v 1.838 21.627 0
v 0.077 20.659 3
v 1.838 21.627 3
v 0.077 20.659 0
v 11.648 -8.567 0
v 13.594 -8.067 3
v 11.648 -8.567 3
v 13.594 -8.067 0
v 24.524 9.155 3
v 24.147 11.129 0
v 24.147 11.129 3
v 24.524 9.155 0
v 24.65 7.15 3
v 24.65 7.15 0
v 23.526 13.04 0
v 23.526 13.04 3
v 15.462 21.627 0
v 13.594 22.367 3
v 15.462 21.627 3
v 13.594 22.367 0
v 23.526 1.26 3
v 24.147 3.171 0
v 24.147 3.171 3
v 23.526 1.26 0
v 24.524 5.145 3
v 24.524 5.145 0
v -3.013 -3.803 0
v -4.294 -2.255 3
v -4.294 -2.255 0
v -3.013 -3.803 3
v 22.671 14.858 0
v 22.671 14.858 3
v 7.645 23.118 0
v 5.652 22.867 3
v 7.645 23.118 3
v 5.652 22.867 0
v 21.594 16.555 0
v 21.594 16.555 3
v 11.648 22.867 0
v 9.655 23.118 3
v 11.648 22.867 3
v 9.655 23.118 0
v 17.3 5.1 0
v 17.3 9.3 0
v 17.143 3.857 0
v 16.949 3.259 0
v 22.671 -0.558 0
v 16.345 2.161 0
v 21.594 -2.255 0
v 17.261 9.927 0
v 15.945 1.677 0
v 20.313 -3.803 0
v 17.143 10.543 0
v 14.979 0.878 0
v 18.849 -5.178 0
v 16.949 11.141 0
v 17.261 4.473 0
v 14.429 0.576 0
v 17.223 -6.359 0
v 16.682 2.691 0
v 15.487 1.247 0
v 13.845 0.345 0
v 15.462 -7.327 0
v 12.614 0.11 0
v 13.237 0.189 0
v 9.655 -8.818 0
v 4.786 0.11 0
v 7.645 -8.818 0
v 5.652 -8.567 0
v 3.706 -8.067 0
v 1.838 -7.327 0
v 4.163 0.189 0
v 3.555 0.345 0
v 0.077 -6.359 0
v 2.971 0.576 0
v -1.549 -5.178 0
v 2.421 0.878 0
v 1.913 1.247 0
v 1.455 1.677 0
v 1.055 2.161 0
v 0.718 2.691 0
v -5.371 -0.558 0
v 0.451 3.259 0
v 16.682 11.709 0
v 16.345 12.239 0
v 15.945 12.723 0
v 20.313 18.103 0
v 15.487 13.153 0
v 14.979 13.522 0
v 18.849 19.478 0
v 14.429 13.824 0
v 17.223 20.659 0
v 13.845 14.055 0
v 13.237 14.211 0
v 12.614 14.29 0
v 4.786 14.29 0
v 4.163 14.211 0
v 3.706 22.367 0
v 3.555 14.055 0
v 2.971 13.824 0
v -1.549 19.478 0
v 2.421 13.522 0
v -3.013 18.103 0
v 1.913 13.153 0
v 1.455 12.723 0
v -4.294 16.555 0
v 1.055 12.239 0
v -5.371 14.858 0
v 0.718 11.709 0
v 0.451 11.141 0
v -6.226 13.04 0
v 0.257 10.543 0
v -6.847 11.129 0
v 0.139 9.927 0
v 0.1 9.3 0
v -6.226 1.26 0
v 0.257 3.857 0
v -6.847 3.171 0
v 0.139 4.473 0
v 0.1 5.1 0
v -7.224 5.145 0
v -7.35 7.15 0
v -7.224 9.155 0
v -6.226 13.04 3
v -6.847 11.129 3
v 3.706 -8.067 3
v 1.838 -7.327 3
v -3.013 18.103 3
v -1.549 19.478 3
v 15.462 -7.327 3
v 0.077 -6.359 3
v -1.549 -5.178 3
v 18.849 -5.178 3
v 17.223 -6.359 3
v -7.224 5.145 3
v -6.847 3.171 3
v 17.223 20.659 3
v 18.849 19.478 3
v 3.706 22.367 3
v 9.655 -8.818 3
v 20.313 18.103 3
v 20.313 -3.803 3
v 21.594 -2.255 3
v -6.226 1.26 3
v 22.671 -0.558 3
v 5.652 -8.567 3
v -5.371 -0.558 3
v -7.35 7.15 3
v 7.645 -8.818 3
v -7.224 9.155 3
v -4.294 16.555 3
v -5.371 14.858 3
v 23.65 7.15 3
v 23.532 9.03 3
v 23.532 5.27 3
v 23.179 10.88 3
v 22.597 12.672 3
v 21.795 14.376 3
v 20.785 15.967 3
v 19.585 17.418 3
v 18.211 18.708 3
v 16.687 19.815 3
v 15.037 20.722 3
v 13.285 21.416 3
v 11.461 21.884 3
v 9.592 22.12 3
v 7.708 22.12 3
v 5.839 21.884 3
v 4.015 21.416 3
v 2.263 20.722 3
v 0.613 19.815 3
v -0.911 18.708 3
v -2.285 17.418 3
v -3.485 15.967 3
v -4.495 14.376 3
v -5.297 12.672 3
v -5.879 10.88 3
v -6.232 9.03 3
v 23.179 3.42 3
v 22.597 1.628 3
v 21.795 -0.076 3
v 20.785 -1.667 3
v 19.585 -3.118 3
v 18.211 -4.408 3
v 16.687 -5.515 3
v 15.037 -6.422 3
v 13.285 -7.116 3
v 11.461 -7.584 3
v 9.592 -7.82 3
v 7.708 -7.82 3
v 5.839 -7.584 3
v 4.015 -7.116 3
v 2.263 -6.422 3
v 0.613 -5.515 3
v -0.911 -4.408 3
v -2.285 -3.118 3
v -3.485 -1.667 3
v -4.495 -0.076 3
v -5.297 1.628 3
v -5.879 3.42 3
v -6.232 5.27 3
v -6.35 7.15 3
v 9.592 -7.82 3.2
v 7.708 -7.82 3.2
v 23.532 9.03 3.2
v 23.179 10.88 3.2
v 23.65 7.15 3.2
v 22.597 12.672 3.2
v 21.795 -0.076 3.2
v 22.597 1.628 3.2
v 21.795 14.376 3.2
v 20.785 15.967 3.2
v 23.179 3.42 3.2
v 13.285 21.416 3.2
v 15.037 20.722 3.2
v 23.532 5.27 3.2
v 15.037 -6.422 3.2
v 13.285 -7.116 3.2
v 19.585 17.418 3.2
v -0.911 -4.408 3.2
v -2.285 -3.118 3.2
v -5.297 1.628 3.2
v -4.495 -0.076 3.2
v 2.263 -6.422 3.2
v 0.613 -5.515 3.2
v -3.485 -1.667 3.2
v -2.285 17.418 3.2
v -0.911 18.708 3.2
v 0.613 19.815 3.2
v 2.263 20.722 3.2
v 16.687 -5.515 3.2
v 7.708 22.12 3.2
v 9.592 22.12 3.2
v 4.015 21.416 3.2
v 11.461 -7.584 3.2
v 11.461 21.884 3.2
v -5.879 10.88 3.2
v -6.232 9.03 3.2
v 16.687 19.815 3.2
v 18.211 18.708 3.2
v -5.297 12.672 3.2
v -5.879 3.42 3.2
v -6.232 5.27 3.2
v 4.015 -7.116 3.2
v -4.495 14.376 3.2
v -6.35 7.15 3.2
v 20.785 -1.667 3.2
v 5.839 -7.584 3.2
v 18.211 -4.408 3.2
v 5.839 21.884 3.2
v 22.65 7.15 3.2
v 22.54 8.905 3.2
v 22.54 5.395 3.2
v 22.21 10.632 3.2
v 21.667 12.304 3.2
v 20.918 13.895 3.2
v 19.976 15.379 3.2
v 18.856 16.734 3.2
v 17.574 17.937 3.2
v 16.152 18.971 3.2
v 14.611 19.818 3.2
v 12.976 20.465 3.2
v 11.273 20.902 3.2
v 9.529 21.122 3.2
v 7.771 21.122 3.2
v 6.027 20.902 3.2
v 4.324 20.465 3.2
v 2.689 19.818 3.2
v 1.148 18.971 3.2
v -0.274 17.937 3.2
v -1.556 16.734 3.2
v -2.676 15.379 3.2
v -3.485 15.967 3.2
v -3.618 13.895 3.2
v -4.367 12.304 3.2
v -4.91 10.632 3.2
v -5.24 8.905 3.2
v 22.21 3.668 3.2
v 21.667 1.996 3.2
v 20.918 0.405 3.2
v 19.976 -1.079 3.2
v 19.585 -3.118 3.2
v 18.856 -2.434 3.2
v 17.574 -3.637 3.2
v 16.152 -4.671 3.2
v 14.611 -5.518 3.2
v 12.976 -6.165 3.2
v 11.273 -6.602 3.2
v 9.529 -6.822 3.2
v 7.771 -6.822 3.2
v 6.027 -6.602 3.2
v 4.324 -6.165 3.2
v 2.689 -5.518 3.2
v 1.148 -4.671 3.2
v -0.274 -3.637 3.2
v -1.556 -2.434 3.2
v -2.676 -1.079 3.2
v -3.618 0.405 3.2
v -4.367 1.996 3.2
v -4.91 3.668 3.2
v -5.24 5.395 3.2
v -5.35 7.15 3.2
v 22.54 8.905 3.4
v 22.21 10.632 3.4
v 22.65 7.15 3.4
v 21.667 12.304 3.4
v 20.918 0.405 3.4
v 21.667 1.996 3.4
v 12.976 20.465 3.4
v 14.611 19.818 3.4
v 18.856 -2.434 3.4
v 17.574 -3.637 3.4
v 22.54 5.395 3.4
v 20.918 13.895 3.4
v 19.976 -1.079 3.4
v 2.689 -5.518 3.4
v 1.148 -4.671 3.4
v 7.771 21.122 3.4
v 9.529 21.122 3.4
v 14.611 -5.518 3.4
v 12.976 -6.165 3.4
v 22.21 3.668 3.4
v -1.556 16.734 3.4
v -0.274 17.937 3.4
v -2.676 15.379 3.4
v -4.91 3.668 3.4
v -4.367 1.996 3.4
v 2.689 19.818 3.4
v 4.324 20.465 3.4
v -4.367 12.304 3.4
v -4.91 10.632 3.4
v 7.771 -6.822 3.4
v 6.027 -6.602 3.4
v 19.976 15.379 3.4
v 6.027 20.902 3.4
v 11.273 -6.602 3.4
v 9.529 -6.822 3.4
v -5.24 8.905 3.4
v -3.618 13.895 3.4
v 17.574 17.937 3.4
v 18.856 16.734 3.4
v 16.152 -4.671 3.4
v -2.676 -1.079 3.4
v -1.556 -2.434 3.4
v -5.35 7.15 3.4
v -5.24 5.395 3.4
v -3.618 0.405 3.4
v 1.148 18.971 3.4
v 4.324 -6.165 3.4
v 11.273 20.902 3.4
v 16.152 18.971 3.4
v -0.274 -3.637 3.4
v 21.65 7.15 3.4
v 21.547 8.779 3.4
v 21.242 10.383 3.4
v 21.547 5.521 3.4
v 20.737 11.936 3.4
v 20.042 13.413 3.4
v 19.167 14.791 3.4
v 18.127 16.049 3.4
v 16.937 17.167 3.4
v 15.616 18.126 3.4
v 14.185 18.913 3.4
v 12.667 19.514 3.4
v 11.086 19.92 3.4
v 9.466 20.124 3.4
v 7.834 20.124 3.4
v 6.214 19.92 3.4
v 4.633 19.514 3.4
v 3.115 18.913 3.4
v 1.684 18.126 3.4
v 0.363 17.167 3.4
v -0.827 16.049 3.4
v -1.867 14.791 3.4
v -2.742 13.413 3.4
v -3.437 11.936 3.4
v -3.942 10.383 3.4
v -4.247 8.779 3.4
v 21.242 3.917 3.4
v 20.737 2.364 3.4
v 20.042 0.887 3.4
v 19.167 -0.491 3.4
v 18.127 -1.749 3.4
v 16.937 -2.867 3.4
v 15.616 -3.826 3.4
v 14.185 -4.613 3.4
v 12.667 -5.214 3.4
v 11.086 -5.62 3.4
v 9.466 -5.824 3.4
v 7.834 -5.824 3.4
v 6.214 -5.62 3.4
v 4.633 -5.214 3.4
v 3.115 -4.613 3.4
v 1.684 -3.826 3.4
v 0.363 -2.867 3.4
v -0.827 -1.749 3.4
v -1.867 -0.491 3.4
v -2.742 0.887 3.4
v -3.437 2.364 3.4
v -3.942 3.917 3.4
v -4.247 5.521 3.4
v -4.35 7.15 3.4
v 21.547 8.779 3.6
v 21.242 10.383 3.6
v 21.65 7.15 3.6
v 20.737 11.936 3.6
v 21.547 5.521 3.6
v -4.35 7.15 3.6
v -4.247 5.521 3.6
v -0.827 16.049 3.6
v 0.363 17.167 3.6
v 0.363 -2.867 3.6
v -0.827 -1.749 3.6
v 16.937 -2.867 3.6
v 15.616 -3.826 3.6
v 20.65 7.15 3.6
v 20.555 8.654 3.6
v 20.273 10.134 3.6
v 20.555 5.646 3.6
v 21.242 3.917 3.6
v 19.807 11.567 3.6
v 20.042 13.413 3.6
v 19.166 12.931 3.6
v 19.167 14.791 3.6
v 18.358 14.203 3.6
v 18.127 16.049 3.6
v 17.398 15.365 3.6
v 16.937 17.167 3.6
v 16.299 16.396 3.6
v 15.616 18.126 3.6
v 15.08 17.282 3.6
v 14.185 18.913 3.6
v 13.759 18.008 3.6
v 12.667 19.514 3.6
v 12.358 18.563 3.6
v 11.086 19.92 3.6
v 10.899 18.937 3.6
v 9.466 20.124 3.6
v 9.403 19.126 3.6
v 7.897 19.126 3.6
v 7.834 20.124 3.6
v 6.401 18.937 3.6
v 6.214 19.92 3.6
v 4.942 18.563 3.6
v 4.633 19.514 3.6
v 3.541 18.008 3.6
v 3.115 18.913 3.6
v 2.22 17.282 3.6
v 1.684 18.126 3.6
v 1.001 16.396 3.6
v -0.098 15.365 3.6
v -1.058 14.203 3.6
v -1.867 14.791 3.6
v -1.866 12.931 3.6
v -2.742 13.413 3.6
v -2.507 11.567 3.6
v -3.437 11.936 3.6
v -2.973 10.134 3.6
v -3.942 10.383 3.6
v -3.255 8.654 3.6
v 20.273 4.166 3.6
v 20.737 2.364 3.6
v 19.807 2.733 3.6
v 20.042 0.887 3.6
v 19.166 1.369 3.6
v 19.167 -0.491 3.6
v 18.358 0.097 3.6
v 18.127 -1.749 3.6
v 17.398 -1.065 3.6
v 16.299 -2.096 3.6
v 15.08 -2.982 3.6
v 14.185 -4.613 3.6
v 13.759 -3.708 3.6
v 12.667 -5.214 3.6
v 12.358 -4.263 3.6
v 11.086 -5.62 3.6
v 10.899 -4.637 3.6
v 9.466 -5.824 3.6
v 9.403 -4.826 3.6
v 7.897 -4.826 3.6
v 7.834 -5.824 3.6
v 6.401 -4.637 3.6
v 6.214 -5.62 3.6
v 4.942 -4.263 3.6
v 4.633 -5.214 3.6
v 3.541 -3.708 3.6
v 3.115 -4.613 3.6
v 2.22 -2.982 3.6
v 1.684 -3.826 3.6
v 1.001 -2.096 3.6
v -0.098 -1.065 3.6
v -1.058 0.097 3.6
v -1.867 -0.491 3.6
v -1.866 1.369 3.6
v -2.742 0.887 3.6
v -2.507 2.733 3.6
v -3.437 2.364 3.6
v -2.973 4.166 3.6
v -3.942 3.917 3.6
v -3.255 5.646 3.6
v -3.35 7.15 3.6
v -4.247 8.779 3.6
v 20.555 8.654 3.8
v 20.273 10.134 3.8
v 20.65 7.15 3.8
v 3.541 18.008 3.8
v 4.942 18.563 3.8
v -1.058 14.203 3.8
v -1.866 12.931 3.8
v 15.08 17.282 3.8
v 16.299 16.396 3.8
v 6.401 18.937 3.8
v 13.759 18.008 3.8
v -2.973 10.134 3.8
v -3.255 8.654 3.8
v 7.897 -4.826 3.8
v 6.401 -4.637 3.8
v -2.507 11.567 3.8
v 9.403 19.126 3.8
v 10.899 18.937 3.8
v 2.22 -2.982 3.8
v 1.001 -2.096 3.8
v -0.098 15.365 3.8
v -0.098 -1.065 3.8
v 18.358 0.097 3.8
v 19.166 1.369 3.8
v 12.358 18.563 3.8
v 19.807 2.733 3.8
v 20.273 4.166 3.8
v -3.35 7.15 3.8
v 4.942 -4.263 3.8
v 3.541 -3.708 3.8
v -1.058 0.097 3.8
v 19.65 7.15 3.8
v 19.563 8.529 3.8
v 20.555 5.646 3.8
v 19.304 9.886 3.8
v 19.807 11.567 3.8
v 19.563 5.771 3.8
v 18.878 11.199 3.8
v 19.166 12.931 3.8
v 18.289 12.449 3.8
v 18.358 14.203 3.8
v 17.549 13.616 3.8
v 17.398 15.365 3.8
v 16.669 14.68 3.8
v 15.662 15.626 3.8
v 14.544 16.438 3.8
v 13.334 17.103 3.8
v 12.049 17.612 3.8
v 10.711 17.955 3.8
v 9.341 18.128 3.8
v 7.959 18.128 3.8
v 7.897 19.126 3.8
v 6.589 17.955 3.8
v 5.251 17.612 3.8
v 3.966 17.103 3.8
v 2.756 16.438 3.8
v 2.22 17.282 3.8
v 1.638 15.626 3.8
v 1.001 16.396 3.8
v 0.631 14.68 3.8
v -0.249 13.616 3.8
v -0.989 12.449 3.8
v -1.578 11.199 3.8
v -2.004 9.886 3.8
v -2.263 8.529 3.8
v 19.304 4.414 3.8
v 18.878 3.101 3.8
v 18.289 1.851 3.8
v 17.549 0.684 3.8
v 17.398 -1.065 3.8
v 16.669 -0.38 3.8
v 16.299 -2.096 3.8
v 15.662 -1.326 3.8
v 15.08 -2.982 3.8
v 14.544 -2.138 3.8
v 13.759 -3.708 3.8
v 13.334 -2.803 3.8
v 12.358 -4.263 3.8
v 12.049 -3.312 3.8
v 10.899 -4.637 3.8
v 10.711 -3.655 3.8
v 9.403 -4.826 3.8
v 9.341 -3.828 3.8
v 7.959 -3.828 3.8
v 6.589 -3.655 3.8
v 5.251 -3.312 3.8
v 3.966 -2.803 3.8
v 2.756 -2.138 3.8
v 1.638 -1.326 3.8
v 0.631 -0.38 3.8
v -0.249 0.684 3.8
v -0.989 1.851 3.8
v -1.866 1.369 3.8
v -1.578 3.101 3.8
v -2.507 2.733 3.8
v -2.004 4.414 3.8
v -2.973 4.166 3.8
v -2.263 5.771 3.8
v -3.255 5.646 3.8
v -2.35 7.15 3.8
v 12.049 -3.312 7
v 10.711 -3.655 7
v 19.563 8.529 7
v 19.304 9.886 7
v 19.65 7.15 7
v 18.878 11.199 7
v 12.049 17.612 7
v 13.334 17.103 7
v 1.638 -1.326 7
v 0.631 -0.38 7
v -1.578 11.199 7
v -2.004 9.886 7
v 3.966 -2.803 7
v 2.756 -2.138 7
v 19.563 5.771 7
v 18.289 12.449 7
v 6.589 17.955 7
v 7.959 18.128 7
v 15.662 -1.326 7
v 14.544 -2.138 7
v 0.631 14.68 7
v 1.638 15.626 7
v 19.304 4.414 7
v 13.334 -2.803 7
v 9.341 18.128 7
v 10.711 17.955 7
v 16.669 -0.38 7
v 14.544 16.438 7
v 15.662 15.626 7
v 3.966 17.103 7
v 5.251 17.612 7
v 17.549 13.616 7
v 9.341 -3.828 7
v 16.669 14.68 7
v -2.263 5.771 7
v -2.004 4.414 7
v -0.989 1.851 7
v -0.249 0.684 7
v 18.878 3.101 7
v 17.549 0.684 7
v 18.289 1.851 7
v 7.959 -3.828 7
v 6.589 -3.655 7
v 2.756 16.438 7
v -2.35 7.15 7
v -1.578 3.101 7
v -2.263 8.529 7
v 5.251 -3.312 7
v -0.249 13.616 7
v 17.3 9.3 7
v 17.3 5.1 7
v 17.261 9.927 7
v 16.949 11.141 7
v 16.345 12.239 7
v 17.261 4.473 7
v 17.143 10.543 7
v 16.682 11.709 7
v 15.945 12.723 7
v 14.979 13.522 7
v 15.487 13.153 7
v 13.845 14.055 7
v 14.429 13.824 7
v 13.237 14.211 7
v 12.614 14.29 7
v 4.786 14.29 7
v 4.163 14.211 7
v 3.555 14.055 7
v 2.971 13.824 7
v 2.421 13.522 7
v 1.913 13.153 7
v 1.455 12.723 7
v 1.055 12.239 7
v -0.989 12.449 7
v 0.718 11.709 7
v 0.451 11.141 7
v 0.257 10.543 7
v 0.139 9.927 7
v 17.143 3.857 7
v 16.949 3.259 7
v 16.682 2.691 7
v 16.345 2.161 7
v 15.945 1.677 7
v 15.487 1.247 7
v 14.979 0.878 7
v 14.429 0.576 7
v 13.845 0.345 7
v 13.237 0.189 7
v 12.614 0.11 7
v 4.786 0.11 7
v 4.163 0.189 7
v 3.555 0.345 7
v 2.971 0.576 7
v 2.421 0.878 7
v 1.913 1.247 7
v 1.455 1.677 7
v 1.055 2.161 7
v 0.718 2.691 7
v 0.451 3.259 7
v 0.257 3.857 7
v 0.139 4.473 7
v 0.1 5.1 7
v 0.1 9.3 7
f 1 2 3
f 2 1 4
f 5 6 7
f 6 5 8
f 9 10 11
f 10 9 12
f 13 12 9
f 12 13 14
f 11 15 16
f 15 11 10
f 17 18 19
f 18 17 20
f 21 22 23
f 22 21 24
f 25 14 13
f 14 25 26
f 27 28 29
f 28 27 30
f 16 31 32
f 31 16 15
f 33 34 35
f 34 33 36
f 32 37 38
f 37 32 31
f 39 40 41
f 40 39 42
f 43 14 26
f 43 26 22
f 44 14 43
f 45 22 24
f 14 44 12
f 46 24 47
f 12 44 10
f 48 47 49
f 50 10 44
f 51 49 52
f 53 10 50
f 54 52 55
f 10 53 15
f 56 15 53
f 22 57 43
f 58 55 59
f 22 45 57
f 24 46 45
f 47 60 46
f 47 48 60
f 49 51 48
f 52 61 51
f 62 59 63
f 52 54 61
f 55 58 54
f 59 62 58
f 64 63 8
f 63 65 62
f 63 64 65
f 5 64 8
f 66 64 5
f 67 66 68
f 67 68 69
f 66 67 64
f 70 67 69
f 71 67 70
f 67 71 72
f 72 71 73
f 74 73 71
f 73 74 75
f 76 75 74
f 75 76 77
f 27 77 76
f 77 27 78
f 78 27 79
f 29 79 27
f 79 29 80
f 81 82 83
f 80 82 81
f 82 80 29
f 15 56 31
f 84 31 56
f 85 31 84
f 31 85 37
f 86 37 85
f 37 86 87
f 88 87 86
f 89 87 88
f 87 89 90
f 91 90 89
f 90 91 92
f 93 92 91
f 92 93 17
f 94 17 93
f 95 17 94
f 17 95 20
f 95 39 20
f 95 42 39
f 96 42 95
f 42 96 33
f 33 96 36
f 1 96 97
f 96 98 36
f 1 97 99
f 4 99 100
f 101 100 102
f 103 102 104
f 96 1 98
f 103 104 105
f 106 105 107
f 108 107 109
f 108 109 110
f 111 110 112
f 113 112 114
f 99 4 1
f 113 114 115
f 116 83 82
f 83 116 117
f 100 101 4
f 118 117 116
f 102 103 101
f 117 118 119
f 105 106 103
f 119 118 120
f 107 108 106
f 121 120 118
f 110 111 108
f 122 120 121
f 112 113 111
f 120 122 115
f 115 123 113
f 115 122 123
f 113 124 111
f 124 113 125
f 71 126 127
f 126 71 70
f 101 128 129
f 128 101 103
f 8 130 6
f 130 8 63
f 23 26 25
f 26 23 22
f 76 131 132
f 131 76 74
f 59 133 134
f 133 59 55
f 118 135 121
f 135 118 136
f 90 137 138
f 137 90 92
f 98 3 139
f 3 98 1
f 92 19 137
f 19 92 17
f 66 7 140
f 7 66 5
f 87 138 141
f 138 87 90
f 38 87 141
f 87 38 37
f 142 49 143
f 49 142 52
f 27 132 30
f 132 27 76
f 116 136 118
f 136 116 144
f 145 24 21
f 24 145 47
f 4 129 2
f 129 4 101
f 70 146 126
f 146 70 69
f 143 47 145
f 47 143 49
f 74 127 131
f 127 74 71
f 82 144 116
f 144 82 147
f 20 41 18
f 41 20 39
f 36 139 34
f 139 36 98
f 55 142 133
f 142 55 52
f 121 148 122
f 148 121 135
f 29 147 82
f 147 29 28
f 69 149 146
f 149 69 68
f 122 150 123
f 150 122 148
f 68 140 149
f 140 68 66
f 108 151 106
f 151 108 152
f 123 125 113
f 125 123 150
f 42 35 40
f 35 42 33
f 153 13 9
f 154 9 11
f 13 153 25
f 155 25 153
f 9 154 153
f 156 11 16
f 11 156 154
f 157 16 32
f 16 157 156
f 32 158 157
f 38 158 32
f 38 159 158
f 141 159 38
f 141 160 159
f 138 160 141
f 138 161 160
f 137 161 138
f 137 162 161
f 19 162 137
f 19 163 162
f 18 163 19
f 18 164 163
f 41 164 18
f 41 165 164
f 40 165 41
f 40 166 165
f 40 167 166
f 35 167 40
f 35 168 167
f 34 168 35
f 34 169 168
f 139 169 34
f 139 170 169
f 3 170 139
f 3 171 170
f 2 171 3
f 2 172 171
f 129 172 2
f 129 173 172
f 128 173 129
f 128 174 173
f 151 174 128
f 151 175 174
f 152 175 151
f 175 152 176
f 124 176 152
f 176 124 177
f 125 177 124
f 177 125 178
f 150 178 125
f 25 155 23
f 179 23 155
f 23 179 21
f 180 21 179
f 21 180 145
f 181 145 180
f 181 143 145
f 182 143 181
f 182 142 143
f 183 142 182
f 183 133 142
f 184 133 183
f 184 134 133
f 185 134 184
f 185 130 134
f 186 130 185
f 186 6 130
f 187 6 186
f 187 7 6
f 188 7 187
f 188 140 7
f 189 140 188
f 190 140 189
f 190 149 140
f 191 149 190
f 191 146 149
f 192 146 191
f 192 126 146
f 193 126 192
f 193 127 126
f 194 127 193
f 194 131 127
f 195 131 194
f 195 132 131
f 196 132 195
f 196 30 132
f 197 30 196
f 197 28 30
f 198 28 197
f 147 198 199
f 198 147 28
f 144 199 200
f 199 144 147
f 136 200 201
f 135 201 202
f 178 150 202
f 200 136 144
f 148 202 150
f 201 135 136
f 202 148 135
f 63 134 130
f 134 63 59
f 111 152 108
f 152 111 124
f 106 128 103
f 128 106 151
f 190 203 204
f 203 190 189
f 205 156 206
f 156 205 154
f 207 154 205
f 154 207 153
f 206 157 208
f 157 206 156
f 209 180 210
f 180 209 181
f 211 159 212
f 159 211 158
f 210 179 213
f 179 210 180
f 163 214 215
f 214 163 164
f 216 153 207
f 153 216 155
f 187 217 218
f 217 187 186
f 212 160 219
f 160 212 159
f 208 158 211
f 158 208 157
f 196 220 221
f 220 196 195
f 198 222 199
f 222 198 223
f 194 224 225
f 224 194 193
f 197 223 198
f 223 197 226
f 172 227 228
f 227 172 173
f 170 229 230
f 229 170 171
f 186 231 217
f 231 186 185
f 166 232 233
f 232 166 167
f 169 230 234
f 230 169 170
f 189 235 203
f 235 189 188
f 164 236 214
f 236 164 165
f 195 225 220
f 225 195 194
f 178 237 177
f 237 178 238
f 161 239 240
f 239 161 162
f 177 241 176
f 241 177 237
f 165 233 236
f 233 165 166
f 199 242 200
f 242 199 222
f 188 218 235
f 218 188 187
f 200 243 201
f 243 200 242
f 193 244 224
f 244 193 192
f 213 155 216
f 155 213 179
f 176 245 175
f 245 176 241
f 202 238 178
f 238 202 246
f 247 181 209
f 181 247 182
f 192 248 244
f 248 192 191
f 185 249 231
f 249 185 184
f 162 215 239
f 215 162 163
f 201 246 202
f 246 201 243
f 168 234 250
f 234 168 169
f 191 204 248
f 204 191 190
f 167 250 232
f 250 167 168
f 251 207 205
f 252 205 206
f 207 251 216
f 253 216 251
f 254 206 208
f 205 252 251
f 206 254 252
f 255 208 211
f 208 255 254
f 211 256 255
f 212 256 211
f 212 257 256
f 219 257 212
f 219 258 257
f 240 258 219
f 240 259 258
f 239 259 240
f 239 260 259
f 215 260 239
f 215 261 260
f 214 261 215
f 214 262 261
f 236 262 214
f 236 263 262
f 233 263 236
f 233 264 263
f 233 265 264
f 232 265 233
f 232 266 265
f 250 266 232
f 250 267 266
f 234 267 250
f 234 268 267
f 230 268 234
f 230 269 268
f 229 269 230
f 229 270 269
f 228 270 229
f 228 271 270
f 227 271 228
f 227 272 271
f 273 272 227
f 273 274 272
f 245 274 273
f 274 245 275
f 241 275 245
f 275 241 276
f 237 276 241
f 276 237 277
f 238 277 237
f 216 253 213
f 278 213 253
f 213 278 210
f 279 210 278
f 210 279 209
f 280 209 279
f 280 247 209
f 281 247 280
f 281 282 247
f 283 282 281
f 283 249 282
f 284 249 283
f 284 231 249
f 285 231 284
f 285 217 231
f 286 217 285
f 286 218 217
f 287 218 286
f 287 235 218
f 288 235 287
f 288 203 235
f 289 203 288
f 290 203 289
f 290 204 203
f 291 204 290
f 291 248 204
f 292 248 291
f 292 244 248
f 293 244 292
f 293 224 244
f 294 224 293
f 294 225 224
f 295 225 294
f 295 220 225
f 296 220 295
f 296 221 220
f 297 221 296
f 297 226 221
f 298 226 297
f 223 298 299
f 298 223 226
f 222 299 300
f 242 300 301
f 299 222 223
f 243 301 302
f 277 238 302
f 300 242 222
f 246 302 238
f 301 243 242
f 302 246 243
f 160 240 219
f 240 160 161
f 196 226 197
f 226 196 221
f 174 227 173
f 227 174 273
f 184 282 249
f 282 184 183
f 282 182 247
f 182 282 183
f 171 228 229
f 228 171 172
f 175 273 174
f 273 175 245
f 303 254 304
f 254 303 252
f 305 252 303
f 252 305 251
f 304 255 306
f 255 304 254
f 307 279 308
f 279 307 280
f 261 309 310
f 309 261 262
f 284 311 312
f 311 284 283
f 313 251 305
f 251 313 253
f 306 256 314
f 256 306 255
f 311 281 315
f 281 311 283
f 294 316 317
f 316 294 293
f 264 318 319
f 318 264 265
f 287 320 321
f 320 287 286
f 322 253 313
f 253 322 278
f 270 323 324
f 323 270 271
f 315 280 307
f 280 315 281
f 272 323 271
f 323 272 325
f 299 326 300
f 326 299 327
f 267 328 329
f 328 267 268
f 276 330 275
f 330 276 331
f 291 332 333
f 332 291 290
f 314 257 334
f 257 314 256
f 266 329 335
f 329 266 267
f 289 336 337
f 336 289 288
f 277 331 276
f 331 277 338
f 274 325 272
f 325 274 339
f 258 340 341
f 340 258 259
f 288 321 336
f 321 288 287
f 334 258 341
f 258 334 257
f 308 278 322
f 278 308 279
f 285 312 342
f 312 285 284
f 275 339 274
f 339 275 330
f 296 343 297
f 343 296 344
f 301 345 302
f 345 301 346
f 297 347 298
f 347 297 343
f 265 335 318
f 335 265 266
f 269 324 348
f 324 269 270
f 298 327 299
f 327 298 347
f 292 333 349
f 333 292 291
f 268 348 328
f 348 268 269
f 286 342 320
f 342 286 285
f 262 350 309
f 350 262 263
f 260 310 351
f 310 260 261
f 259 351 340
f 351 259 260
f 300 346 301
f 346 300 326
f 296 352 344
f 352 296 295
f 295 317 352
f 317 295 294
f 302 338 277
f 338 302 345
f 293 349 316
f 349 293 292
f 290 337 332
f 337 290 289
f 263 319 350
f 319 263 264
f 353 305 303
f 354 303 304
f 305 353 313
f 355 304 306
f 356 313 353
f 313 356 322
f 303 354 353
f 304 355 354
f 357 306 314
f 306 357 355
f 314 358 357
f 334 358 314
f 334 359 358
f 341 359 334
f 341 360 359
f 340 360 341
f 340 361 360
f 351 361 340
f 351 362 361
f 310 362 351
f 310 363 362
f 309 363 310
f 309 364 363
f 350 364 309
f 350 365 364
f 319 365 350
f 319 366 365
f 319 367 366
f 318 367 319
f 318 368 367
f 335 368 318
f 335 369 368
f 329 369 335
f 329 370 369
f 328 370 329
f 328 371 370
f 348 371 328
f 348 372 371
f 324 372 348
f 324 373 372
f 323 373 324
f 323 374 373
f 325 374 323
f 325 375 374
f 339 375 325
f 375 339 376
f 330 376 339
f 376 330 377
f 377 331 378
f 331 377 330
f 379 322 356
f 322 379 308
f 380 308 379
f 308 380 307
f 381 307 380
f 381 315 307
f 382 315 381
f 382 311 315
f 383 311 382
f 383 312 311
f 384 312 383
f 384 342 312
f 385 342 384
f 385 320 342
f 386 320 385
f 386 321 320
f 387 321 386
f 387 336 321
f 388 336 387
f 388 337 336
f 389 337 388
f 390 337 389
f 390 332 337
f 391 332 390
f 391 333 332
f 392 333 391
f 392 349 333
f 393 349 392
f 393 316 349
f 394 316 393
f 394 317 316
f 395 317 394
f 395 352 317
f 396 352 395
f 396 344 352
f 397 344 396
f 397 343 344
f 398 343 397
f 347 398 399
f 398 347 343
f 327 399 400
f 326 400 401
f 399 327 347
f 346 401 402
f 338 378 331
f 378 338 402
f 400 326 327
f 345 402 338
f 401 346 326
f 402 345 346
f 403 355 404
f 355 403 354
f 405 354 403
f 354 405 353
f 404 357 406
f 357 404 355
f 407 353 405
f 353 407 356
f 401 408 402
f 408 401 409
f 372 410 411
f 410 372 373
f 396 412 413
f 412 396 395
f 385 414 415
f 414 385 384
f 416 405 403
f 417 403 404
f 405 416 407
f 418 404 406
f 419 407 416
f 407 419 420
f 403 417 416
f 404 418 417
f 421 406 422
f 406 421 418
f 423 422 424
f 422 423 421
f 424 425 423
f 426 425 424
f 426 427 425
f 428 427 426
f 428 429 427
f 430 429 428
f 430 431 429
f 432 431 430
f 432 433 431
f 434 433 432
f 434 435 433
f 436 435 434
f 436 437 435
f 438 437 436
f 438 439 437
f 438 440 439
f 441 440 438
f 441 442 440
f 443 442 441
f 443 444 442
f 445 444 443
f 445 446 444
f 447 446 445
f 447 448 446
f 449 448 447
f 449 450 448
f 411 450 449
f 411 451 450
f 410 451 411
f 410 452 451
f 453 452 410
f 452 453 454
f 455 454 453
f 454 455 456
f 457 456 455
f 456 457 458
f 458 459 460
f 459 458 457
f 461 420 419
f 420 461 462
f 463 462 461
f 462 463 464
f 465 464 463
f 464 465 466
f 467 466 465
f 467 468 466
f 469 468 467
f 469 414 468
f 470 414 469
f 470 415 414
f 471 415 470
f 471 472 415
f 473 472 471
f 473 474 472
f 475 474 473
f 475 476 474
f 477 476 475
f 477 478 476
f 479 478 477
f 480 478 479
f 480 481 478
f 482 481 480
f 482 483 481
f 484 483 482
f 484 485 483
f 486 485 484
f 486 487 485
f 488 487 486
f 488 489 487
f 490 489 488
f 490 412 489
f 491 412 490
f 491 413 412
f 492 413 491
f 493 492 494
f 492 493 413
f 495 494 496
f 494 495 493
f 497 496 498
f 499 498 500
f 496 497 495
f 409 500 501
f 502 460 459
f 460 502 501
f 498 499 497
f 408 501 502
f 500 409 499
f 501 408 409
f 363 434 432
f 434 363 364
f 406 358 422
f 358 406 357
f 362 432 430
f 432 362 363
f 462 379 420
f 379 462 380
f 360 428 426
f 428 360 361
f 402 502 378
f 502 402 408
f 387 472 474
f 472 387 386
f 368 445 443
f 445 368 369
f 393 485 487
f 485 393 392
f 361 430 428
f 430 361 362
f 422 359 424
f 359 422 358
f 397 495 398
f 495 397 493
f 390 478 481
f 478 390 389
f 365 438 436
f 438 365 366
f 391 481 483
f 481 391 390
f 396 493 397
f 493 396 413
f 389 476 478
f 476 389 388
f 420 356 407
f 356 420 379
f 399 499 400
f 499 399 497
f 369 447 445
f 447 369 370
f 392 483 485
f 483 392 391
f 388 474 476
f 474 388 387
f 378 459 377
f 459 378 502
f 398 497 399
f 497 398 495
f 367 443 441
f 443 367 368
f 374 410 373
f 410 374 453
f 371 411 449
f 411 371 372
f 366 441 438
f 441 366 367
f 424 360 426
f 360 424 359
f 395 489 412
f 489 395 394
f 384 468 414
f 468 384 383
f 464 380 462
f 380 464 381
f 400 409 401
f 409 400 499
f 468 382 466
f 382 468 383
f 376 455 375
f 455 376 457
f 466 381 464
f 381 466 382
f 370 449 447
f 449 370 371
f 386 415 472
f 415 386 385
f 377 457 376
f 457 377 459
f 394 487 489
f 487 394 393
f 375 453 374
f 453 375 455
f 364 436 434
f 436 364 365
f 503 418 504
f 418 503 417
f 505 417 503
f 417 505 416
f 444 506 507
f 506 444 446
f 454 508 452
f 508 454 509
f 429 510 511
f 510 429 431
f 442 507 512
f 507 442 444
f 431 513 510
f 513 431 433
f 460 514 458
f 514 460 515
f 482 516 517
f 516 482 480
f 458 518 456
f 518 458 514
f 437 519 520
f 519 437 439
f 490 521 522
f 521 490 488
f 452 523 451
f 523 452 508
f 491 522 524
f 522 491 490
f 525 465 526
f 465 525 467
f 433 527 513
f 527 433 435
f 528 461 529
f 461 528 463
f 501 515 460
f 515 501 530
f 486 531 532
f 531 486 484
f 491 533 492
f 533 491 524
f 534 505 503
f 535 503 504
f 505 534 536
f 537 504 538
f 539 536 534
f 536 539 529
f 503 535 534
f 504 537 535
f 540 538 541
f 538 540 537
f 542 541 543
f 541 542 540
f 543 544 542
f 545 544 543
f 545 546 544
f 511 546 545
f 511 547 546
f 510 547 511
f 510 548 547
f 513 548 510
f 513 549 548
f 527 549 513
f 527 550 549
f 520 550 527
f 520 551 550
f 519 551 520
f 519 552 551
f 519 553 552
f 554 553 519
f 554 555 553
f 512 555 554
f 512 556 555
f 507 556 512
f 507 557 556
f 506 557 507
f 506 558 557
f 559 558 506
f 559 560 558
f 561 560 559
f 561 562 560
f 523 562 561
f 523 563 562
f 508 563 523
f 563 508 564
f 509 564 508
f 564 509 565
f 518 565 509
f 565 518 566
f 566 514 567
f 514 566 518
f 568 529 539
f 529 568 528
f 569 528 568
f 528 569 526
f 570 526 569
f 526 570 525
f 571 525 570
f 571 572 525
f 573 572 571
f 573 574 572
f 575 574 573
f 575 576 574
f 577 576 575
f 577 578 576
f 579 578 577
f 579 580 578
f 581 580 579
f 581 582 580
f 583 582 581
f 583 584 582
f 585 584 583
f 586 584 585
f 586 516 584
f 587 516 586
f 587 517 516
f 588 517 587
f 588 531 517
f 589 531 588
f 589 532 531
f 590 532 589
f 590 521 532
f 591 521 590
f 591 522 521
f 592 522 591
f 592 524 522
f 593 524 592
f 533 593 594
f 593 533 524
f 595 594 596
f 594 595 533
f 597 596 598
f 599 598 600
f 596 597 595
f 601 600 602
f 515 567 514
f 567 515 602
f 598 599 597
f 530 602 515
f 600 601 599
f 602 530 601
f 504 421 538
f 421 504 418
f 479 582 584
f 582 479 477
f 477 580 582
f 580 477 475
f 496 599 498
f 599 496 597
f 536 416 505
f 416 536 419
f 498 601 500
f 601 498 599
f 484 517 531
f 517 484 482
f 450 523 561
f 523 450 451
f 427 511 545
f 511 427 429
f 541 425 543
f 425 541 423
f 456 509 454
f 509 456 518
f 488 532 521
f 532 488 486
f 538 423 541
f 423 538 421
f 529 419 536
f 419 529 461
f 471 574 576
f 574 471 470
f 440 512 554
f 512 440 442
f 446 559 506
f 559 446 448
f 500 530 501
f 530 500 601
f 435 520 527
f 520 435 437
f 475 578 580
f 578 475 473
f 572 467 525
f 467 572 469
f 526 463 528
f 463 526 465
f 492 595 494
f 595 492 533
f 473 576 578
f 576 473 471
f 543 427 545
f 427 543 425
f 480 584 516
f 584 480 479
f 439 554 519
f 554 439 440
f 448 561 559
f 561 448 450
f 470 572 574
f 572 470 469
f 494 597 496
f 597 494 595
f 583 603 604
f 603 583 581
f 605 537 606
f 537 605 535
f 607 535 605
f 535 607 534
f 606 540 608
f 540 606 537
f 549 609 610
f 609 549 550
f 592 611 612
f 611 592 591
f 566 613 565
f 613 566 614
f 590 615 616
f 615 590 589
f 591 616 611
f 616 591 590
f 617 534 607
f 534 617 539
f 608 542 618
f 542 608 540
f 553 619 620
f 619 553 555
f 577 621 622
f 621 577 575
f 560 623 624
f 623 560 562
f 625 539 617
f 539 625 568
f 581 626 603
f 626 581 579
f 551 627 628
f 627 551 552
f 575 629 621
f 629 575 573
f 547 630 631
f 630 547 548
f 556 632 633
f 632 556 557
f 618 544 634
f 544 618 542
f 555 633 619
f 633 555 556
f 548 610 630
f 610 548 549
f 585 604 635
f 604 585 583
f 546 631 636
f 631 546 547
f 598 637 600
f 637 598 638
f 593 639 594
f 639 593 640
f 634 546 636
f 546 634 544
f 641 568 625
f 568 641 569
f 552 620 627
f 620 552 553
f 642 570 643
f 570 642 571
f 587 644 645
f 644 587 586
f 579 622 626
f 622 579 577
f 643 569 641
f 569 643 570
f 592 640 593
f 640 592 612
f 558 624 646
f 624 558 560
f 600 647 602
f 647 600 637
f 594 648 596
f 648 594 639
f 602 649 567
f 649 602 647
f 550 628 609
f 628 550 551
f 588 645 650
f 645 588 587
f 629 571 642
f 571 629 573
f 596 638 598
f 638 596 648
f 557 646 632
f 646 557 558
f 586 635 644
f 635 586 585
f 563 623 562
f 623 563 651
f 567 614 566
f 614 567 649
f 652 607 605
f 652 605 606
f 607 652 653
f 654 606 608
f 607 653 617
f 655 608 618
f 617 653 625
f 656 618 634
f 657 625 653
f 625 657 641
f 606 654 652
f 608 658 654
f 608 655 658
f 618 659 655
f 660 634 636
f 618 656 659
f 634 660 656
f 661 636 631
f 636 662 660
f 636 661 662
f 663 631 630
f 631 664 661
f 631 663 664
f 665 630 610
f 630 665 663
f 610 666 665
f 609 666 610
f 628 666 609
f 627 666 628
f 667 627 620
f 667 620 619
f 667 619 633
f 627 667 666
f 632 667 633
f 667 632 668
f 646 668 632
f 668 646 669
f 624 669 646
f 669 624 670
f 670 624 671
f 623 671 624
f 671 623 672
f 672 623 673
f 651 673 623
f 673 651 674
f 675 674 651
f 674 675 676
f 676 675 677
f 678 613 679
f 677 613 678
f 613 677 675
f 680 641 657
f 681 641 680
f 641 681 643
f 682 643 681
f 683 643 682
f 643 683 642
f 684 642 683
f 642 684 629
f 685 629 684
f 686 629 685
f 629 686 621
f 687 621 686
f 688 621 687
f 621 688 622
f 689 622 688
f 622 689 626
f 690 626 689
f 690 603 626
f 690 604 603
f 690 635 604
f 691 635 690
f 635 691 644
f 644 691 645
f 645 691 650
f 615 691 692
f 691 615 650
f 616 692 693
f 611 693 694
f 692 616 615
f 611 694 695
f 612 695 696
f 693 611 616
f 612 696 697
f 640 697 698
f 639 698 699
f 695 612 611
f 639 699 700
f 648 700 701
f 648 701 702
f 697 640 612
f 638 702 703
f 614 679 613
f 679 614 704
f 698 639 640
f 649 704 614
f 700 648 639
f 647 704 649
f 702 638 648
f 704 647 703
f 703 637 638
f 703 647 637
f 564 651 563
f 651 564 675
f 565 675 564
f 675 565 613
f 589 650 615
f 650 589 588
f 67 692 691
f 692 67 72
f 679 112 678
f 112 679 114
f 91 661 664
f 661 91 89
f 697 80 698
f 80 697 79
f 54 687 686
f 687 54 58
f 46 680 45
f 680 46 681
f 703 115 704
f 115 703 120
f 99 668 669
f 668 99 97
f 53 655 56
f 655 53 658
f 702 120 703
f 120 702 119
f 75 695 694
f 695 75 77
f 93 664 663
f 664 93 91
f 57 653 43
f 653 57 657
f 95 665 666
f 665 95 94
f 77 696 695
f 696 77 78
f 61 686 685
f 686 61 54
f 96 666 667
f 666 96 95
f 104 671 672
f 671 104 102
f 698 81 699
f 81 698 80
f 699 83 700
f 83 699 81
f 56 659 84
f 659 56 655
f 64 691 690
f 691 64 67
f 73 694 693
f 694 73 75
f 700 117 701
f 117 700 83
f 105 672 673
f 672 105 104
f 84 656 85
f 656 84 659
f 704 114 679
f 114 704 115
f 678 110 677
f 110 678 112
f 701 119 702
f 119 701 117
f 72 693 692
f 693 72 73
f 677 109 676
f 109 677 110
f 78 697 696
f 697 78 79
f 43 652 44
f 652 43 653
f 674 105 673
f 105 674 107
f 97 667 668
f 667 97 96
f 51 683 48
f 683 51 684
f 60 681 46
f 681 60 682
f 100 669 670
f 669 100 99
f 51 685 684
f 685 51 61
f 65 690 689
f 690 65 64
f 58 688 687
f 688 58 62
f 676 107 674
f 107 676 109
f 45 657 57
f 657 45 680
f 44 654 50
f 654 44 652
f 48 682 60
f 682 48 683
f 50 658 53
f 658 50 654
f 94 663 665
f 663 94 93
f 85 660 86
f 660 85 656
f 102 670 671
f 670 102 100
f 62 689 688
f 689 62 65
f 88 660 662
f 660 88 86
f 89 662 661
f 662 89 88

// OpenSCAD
$fn=50;

difference() {
//color("green") translate([17.3/2, 14.3/2, 0]) cylinder(r=13,h=7);
    color("yellow") translate([17.3/2, 14.3/2, 0]) { 
        cylinder(r=16,h=3);
        cylinder(r=15,h=3.2);
        cylinder(r=14,h=3.4);
        cylinder(r=13,h=3.6);
        cylinder(r=12,h=3.8);
        cylinder(r=11,h=7);
    }
    color("red") translate([5.1, 5.1, -1]) {
        minkowski() {
            cube([7.2,4.2,10]);
            cylinder(r=5,h=10);
        }
    }
}
